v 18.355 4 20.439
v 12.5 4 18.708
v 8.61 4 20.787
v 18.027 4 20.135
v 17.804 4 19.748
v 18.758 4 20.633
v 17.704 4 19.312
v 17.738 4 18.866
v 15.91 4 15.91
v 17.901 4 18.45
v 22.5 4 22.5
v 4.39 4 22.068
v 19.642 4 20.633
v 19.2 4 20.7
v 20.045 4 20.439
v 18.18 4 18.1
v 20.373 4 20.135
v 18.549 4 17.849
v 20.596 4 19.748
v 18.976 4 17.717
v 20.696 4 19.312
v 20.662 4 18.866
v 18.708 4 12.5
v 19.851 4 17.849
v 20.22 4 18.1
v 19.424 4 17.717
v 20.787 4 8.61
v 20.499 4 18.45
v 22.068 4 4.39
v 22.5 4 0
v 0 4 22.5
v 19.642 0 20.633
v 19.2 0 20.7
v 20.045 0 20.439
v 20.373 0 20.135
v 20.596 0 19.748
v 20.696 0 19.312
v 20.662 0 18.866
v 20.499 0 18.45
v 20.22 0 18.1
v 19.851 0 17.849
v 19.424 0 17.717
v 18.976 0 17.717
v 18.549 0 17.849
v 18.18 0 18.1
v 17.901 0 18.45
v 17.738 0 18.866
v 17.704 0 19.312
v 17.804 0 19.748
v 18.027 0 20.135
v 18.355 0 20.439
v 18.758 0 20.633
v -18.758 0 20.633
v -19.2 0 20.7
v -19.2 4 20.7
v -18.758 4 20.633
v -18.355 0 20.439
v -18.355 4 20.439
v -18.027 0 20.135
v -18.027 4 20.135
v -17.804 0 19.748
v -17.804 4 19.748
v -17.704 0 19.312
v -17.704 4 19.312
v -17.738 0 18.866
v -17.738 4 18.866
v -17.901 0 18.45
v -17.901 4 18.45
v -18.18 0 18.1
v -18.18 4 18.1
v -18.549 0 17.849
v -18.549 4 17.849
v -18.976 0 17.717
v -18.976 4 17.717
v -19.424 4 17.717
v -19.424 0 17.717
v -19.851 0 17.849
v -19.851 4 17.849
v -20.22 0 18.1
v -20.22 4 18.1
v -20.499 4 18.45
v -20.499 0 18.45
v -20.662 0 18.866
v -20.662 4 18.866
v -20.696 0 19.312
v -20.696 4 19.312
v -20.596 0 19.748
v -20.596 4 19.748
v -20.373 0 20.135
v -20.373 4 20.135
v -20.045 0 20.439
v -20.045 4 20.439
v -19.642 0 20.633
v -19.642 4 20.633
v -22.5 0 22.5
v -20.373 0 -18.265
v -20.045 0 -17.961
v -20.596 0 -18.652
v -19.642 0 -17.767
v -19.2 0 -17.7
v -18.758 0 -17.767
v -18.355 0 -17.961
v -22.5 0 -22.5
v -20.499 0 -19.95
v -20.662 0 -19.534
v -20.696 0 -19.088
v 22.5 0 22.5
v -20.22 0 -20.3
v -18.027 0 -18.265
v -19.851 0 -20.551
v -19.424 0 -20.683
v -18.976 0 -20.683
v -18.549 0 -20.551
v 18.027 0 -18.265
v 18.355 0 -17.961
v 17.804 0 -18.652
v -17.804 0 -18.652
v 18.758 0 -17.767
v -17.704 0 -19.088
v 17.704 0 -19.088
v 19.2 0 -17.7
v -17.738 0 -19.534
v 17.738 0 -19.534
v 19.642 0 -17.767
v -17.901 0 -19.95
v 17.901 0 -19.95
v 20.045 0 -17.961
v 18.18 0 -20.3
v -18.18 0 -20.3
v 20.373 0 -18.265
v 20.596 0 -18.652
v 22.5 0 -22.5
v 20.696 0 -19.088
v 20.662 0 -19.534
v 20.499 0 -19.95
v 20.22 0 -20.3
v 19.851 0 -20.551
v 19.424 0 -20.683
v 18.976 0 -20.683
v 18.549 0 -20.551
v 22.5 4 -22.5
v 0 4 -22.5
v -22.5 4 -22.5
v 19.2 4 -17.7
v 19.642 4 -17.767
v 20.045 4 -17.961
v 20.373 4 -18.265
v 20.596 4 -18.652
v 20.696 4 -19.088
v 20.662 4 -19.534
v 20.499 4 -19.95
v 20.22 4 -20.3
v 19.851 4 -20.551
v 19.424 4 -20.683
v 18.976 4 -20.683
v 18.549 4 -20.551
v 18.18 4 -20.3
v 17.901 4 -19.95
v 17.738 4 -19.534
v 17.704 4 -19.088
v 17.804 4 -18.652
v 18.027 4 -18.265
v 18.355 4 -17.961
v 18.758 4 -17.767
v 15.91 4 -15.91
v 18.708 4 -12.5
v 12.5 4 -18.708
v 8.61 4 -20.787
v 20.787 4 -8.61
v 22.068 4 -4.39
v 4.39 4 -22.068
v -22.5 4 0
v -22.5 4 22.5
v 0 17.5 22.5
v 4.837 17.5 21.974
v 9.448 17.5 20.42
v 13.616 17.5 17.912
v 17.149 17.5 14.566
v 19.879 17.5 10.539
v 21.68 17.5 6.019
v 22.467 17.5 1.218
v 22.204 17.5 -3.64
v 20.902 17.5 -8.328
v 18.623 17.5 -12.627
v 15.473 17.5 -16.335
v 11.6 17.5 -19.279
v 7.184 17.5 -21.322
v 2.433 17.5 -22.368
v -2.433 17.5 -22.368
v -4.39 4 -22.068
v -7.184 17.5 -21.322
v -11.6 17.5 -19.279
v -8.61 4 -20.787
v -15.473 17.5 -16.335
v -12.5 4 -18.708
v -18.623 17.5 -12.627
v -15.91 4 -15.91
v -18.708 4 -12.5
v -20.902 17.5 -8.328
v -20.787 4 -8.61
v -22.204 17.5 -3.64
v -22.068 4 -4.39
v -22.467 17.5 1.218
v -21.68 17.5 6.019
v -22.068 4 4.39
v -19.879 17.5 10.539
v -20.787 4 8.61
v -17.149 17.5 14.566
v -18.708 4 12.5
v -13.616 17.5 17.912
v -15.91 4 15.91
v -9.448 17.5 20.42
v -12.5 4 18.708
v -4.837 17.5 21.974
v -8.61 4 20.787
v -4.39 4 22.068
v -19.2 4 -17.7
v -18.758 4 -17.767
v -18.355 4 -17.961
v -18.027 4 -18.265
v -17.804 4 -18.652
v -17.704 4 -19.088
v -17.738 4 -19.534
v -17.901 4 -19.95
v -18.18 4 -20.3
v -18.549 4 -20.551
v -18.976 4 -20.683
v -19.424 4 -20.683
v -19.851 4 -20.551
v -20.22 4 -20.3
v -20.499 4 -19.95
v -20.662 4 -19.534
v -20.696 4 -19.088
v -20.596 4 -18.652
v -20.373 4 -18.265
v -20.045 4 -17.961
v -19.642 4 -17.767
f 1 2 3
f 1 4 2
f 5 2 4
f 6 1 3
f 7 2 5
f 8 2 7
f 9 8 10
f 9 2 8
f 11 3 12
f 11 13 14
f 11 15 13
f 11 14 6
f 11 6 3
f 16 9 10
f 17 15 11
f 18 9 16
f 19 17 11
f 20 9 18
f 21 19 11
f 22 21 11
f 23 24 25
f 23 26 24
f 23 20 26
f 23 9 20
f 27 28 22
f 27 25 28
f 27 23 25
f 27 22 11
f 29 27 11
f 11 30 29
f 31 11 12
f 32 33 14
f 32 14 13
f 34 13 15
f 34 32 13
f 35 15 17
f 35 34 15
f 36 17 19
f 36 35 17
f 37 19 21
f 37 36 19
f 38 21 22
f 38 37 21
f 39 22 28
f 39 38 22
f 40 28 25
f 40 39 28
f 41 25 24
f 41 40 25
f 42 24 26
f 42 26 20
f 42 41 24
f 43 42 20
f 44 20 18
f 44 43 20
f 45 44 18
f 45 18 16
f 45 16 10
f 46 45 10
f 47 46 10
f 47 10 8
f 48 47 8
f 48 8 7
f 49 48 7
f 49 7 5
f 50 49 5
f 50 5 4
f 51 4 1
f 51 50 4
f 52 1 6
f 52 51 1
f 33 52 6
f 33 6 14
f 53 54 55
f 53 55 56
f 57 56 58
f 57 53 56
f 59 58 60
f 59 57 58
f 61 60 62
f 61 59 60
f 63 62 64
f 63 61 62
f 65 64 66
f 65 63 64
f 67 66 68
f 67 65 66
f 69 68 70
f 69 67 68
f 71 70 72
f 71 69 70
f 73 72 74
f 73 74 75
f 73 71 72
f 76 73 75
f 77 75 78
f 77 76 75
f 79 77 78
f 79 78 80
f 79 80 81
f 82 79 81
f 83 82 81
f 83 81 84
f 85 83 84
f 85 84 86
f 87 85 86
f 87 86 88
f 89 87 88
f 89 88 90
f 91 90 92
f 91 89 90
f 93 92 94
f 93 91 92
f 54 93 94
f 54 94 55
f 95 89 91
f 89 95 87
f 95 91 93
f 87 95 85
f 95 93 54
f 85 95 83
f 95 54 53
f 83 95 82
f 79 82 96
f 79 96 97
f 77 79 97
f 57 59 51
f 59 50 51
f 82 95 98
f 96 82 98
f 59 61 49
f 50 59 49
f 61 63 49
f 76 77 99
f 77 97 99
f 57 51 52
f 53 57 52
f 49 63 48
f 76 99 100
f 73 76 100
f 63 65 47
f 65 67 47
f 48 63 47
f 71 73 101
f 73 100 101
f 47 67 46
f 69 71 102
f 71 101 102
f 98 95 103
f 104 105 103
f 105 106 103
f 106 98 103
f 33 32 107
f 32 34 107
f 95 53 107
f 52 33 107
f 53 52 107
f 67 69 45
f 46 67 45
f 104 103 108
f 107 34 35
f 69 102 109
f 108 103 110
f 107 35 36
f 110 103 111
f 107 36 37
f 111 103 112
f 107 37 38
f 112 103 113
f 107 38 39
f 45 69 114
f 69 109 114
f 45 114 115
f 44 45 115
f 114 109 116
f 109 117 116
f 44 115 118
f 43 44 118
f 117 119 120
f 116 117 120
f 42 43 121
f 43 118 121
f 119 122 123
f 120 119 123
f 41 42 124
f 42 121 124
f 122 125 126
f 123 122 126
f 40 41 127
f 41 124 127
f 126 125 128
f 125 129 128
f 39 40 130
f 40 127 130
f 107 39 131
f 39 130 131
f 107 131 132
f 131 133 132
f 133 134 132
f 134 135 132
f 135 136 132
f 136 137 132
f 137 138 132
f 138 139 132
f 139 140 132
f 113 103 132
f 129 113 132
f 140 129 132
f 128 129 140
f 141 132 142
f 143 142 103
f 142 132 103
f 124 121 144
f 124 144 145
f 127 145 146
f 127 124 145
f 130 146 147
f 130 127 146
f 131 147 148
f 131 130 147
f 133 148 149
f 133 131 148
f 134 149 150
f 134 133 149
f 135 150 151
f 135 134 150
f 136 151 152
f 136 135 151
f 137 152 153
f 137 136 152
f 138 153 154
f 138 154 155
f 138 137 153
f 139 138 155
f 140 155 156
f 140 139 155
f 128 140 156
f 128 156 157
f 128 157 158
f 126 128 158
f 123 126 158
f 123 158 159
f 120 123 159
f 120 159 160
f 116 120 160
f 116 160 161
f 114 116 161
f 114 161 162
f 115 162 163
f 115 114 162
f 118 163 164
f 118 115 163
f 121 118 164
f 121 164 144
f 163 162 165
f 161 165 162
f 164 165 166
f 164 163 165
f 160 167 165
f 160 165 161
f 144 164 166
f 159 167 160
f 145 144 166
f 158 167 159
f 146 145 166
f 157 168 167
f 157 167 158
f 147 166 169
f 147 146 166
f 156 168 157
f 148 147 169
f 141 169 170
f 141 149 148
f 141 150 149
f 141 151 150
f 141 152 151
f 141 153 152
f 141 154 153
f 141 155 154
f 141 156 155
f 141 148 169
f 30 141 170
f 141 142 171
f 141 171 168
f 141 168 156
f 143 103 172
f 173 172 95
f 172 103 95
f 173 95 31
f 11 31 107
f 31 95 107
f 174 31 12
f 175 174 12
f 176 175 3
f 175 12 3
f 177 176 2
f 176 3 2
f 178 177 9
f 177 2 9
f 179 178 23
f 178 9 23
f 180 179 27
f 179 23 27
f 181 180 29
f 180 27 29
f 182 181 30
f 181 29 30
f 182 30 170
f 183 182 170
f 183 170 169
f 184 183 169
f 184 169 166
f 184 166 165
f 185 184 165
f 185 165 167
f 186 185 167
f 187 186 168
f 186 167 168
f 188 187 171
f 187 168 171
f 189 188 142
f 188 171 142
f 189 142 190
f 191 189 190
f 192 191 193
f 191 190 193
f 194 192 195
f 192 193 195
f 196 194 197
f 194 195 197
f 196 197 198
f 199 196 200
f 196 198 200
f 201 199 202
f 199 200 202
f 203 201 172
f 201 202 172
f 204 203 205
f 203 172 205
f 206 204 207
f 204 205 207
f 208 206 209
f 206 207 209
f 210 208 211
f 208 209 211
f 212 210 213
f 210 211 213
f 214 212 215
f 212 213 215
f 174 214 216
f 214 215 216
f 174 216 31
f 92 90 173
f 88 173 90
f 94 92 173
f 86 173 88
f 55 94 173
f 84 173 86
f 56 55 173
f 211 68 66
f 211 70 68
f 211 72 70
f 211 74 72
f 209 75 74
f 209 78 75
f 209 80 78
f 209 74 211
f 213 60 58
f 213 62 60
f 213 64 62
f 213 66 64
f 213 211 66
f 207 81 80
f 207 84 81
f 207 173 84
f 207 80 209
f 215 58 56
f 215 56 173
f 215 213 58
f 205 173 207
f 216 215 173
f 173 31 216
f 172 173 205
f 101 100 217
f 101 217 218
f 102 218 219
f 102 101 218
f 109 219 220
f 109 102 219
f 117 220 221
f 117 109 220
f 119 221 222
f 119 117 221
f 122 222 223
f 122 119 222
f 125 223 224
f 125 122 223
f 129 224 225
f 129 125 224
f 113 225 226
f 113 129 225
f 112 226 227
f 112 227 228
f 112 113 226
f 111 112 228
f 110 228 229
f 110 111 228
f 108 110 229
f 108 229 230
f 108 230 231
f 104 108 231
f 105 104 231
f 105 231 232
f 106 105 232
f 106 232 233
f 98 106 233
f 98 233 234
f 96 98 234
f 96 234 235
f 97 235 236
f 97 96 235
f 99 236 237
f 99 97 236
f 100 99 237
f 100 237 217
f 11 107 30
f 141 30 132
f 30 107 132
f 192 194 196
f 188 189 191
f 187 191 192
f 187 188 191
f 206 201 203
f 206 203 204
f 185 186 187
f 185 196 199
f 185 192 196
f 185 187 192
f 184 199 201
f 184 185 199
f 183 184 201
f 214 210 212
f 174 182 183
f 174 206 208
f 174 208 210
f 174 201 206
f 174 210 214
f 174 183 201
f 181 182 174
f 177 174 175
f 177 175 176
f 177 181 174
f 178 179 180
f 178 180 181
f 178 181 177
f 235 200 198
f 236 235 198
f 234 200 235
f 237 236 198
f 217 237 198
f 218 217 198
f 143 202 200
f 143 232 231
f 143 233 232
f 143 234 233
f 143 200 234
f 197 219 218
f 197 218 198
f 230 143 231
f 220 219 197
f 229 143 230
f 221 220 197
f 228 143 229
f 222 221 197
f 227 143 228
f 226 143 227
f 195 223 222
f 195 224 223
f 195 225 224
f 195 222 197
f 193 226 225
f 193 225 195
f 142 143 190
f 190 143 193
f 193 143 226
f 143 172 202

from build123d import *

# Parameters (mm, degrees)
SKETCH_1_W      = 45
SKETCH_1_H      = 45
SKETCH_1_R      = 1.5
EXTRUDE_1_DEPTH = 4
EXTRUDE_2_DEPTH = 17.5


with BuildPart() as part:
    # 草图1 → 凸台-拉伸1 (new body)
    with BuildSketch(Plane(origin=(0, 0, 0), x_dir=(1, 0, 0), z_dir=(0, 1, 0))):
        Rectangle(SKETCH_1_W, SKETCH_1_H)
        with Locations((-19.2, 19.2)):
            Circle(SKETCH_1_R, mode=Mode.SUBTRACT)
        with Locations((19.2, 19.2)):
            Circle(SKETCH_1_R, mode=Mode.SUBTRACT)
        with Locations((19.2, -19.2)):
            Circle(SKETCH_1_R, mode=Mode.SUBTRACT)
        with Locations((-19.2, -19.2)):
            Circle(SKETCH_1_R, mode=Mode.SUBTRACT)
    extrude(amount=EXTRUDE_1_DEPTH)

    # 草图1<3> → 凸台-拉伸2 (add)
    with BuildSketch(Plane(origin=(0, 0, 0), x_dir=(1, 0, 0), z_dir=(0, 1, 0))):
        with BuildLine():
            ThreePointArc((22.5, 0), (15.909902585, 15.909902568), (2.5e-08, 22.5))
            ThreePointArc((2.5e-08, 22.5), (-15.909902559, 15.909902594), (-22.5, 2.4e-08))
            ThreePointArc((-22.5, 2.4e-08), (-15.909902568, -15.909902586), (5e-08, -22.5))
            ThreePointArc((5e-08, -22.5), (15.909902594, -15.909902559), (22.5, 0))
        make_face()
    extrude(amount=EXTRUDE_2_DEPTH)


solid = part.part
